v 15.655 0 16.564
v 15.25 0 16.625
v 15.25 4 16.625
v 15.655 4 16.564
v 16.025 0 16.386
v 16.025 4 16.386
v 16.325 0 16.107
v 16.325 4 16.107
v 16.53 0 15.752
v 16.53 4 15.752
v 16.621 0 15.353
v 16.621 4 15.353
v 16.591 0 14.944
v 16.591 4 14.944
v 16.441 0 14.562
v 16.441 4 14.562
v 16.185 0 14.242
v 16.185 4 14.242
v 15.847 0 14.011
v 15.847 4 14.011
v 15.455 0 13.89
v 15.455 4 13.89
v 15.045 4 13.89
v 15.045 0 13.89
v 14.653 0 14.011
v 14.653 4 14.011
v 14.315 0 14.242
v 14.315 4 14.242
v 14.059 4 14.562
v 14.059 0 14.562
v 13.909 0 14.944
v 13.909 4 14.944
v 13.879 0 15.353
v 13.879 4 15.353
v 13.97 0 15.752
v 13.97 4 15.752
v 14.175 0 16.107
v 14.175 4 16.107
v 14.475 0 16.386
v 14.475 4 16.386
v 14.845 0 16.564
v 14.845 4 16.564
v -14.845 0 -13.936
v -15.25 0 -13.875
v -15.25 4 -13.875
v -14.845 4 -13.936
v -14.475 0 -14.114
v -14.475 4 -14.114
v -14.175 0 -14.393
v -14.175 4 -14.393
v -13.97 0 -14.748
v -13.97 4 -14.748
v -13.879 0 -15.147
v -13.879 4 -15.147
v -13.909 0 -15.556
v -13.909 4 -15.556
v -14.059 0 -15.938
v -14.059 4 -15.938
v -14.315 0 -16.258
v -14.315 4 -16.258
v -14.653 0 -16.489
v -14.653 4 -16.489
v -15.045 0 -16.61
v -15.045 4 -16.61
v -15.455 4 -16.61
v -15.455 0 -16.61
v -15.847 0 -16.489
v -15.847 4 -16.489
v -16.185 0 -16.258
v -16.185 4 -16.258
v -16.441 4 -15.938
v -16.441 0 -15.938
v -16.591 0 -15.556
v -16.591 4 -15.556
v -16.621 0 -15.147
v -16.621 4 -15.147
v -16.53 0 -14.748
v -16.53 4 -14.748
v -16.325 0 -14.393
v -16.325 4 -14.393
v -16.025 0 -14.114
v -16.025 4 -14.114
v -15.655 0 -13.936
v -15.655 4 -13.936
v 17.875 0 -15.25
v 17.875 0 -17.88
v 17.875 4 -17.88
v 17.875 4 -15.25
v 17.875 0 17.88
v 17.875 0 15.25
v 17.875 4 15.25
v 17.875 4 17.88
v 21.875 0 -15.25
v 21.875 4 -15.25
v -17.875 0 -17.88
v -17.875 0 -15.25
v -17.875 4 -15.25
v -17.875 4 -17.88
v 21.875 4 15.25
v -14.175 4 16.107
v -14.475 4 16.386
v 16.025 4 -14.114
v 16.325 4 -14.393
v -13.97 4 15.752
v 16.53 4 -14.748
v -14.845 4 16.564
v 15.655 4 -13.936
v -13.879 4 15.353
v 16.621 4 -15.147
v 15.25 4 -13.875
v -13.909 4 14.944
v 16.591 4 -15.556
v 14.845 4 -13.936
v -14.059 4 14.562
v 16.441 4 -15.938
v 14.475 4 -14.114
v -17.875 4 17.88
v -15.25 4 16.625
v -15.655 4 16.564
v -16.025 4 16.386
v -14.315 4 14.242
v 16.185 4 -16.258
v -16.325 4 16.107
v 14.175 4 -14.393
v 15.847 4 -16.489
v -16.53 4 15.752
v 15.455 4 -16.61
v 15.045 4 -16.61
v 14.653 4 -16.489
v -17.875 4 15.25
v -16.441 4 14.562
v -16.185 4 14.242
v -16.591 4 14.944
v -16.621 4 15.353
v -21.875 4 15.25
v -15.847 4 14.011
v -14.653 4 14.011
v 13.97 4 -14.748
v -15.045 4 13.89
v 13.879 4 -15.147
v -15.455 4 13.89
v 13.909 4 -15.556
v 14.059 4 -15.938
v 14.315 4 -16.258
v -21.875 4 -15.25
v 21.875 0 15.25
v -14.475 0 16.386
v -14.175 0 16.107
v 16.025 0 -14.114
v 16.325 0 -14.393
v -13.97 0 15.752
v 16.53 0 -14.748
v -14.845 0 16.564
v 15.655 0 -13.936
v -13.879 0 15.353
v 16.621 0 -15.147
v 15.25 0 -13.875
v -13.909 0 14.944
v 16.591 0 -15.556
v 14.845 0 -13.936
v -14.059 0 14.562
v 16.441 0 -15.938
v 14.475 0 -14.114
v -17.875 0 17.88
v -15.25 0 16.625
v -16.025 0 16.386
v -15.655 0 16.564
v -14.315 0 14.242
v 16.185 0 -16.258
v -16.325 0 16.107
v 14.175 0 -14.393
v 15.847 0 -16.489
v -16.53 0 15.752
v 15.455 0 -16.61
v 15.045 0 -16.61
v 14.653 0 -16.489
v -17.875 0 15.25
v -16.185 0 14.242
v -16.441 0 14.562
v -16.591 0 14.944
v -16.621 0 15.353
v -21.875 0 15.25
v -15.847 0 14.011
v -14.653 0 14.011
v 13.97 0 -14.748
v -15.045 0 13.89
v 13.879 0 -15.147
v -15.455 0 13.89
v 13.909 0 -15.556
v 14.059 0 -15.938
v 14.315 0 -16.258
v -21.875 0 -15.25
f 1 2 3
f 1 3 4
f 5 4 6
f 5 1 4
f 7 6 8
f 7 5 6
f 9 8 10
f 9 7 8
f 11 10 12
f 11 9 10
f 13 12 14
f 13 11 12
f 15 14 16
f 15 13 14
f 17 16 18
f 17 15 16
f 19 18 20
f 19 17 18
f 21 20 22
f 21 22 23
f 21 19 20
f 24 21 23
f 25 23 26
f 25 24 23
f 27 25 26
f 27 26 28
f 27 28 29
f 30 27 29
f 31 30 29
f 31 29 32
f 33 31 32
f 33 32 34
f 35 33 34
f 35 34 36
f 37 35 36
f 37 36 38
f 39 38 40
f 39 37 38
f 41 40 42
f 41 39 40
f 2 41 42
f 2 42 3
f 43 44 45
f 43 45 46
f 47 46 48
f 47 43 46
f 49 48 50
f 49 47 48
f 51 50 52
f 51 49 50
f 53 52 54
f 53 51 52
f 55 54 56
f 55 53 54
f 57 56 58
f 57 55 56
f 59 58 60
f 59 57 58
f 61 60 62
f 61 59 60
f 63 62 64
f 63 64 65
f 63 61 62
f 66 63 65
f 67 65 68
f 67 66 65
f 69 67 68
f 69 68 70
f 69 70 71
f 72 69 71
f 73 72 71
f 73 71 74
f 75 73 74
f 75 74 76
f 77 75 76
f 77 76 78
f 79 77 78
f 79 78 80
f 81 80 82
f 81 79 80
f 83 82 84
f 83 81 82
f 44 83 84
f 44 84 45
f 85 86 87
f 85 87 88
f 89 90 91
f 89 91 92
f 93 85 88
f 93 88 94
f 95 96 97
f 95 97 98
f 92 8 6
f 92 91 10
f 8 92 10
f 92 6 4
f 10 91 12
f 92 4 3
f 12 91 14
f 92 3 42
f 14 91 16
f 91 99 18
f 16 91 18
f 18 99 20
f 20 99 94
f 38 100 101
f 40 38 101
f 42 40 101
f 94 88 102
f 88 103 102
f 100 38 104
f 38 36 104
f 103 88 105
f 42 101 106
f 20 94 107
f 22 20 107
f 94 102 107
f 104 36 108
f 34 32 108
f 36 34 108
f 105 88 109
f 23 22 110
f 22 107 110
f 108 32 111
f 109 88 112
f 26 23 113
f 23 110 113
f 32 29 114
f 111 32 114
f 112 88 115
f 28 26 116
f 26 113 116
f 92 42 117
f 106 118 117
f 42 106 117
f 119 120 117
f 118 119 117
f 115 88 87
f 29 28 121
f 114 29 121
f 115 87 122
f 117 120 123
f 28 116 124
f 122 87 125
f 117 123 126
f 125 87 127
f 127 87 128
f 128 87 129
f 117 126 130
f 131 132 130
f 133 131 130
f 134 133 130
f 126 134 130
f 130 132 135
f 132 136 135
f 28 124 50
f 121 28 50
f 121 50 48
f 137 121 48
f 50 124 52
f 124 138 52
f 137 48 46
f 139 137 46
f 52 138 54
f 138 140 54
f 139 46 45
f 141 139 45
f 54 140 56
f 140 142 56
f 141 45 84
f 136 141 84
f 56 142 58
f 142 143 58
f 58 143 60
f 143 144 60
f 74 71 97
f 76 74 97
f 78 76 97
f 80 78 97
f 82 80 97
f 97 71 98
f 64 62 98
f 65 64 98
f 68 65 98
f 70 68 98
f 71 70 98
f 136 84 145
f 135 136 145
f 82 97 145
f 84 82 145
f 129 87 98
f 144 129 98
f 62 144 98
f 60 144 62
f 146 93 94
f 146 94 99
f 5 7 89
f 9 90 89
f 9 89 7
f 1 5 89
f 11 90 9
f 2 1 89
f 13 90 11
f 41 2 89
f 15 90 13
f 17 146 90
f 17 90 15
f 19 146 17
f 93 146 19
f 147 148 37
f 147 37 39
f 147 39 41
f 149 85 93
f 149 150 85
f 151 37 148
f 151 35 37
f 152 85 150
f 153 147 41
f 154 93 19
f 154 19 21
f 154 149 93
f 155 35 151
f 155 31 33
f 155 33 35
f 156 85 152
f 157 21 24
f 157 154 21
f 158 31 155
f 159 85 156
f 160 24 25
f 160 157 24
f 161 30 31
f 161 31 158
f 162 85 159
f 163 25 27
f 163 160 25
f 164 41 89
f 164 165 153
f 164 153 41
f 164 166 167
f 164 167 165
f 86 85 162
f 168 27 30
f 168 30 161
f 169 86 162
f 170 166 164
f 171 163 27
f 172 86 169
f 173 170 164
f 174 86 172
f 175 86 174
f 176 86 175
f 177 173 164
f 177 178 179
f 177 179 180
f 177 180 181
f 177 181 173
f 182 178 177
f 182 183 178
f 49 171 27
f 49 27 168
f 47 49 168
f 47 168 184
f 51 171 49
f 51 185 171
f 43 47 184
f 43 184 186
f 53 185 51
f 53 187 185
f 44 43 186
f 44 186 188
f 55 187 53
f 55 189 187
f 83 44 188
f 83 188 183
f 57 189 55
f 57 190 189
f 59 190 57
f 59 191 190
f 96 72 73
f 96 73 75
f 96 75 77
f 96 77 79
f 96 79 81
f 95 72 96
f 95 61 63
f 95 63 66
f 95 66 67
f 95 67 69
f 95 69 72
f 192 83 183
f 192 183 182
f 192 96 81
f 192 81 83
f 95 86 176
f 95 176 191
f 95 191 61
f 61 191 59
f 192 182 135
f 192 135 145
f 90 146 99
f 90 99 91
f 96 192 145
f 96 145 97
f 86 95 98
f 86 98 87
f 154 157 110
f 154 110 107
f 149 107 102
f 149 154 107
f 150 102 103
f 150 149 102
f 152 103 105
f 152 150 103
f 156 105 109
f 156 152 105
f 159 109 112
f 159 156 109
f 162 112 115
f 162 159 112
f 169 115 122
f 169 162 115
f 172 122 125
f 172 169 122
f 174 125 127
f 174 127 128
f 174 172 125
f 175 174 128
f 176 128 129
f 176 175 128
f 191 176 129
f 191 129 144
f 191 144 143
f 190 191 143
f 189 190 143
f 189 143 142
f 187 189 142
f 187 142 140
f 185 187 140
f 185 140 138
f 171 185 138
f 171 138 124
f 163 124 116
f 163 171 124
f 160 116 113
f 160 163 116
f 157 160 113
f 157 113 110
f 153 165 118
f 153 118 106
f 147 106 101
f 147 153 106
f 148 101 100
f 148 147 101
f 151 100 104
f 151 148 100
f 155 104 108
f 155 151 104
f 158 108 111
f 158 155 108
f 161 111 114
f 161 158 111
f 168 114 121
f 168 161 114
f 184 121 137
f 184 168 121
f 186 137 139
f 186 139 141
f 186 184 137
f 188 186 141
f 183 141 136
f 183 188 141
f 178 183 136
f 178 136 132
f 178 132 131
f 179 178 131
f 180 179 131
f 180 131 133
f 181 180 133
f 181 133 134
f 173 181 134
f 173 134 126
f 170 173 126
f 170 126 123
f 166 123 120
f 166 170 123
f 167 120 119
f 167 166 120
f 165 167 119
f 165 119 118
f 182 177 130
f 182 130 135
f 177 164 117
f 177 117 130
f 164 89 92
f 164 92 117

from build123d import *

# Parameters (mm, degrees)
BOSS_EXTRUDE1_DEPTH = 4
SKETCH1_R           = 1.375
CUT_EXTRUDE1_DEPTH  = 4


with BuildPart() as part:
    # Sketch2 → Boss-Extrude1 (new body)
    with BuildSketch(Plane(origin=(0, 0, 0), x_dir=(1, 0, 0), z_dir=(0, 1, 0))):
        Polygon((17.875, 15.25), (21.875, 15.25), (21.875, -15.25), (17.875, -15.25), (17.875, -17.88), (-17.875, -17.88), (-17.875, -15.25), (-21.875, -15.25), (-21.875, 15.25), (-17.875, 15.25), (-17.875, 17.88), (17.875, 17.88), align=None)
    extrude(amount=BOSS_EXTRUDE1_DEPTH)

    # Sketch1 → Cut-Extrude1 (cut)
    with BuildSketch(Plane(origin=(0, 0, 0), x_dir=(1, 0, 0), z_dir=(0, 1, 0))):
        with Locations(Location((-15.25, 15.25, 0), (0, 0, 270))):
            Circle(SKETCH1_R)
        with Locations(Location((15.25, 15.25, 0), (0, 0, 270))):
            Circle(SKETCH1_R)
        with Locations(Location((15.25, -15.25, 0), (0, 0, 270))):
            Circle(SKETCH1_R)
        with Locations(Location((-15.25, -15.25, 0), (0, 0, 270))):
            Circle(SKETCH1_R)
    extrude(amount=CUT_EXTRUDE1_DEPTH, mode=Mode.SUBTRACT)


solid = part.part
